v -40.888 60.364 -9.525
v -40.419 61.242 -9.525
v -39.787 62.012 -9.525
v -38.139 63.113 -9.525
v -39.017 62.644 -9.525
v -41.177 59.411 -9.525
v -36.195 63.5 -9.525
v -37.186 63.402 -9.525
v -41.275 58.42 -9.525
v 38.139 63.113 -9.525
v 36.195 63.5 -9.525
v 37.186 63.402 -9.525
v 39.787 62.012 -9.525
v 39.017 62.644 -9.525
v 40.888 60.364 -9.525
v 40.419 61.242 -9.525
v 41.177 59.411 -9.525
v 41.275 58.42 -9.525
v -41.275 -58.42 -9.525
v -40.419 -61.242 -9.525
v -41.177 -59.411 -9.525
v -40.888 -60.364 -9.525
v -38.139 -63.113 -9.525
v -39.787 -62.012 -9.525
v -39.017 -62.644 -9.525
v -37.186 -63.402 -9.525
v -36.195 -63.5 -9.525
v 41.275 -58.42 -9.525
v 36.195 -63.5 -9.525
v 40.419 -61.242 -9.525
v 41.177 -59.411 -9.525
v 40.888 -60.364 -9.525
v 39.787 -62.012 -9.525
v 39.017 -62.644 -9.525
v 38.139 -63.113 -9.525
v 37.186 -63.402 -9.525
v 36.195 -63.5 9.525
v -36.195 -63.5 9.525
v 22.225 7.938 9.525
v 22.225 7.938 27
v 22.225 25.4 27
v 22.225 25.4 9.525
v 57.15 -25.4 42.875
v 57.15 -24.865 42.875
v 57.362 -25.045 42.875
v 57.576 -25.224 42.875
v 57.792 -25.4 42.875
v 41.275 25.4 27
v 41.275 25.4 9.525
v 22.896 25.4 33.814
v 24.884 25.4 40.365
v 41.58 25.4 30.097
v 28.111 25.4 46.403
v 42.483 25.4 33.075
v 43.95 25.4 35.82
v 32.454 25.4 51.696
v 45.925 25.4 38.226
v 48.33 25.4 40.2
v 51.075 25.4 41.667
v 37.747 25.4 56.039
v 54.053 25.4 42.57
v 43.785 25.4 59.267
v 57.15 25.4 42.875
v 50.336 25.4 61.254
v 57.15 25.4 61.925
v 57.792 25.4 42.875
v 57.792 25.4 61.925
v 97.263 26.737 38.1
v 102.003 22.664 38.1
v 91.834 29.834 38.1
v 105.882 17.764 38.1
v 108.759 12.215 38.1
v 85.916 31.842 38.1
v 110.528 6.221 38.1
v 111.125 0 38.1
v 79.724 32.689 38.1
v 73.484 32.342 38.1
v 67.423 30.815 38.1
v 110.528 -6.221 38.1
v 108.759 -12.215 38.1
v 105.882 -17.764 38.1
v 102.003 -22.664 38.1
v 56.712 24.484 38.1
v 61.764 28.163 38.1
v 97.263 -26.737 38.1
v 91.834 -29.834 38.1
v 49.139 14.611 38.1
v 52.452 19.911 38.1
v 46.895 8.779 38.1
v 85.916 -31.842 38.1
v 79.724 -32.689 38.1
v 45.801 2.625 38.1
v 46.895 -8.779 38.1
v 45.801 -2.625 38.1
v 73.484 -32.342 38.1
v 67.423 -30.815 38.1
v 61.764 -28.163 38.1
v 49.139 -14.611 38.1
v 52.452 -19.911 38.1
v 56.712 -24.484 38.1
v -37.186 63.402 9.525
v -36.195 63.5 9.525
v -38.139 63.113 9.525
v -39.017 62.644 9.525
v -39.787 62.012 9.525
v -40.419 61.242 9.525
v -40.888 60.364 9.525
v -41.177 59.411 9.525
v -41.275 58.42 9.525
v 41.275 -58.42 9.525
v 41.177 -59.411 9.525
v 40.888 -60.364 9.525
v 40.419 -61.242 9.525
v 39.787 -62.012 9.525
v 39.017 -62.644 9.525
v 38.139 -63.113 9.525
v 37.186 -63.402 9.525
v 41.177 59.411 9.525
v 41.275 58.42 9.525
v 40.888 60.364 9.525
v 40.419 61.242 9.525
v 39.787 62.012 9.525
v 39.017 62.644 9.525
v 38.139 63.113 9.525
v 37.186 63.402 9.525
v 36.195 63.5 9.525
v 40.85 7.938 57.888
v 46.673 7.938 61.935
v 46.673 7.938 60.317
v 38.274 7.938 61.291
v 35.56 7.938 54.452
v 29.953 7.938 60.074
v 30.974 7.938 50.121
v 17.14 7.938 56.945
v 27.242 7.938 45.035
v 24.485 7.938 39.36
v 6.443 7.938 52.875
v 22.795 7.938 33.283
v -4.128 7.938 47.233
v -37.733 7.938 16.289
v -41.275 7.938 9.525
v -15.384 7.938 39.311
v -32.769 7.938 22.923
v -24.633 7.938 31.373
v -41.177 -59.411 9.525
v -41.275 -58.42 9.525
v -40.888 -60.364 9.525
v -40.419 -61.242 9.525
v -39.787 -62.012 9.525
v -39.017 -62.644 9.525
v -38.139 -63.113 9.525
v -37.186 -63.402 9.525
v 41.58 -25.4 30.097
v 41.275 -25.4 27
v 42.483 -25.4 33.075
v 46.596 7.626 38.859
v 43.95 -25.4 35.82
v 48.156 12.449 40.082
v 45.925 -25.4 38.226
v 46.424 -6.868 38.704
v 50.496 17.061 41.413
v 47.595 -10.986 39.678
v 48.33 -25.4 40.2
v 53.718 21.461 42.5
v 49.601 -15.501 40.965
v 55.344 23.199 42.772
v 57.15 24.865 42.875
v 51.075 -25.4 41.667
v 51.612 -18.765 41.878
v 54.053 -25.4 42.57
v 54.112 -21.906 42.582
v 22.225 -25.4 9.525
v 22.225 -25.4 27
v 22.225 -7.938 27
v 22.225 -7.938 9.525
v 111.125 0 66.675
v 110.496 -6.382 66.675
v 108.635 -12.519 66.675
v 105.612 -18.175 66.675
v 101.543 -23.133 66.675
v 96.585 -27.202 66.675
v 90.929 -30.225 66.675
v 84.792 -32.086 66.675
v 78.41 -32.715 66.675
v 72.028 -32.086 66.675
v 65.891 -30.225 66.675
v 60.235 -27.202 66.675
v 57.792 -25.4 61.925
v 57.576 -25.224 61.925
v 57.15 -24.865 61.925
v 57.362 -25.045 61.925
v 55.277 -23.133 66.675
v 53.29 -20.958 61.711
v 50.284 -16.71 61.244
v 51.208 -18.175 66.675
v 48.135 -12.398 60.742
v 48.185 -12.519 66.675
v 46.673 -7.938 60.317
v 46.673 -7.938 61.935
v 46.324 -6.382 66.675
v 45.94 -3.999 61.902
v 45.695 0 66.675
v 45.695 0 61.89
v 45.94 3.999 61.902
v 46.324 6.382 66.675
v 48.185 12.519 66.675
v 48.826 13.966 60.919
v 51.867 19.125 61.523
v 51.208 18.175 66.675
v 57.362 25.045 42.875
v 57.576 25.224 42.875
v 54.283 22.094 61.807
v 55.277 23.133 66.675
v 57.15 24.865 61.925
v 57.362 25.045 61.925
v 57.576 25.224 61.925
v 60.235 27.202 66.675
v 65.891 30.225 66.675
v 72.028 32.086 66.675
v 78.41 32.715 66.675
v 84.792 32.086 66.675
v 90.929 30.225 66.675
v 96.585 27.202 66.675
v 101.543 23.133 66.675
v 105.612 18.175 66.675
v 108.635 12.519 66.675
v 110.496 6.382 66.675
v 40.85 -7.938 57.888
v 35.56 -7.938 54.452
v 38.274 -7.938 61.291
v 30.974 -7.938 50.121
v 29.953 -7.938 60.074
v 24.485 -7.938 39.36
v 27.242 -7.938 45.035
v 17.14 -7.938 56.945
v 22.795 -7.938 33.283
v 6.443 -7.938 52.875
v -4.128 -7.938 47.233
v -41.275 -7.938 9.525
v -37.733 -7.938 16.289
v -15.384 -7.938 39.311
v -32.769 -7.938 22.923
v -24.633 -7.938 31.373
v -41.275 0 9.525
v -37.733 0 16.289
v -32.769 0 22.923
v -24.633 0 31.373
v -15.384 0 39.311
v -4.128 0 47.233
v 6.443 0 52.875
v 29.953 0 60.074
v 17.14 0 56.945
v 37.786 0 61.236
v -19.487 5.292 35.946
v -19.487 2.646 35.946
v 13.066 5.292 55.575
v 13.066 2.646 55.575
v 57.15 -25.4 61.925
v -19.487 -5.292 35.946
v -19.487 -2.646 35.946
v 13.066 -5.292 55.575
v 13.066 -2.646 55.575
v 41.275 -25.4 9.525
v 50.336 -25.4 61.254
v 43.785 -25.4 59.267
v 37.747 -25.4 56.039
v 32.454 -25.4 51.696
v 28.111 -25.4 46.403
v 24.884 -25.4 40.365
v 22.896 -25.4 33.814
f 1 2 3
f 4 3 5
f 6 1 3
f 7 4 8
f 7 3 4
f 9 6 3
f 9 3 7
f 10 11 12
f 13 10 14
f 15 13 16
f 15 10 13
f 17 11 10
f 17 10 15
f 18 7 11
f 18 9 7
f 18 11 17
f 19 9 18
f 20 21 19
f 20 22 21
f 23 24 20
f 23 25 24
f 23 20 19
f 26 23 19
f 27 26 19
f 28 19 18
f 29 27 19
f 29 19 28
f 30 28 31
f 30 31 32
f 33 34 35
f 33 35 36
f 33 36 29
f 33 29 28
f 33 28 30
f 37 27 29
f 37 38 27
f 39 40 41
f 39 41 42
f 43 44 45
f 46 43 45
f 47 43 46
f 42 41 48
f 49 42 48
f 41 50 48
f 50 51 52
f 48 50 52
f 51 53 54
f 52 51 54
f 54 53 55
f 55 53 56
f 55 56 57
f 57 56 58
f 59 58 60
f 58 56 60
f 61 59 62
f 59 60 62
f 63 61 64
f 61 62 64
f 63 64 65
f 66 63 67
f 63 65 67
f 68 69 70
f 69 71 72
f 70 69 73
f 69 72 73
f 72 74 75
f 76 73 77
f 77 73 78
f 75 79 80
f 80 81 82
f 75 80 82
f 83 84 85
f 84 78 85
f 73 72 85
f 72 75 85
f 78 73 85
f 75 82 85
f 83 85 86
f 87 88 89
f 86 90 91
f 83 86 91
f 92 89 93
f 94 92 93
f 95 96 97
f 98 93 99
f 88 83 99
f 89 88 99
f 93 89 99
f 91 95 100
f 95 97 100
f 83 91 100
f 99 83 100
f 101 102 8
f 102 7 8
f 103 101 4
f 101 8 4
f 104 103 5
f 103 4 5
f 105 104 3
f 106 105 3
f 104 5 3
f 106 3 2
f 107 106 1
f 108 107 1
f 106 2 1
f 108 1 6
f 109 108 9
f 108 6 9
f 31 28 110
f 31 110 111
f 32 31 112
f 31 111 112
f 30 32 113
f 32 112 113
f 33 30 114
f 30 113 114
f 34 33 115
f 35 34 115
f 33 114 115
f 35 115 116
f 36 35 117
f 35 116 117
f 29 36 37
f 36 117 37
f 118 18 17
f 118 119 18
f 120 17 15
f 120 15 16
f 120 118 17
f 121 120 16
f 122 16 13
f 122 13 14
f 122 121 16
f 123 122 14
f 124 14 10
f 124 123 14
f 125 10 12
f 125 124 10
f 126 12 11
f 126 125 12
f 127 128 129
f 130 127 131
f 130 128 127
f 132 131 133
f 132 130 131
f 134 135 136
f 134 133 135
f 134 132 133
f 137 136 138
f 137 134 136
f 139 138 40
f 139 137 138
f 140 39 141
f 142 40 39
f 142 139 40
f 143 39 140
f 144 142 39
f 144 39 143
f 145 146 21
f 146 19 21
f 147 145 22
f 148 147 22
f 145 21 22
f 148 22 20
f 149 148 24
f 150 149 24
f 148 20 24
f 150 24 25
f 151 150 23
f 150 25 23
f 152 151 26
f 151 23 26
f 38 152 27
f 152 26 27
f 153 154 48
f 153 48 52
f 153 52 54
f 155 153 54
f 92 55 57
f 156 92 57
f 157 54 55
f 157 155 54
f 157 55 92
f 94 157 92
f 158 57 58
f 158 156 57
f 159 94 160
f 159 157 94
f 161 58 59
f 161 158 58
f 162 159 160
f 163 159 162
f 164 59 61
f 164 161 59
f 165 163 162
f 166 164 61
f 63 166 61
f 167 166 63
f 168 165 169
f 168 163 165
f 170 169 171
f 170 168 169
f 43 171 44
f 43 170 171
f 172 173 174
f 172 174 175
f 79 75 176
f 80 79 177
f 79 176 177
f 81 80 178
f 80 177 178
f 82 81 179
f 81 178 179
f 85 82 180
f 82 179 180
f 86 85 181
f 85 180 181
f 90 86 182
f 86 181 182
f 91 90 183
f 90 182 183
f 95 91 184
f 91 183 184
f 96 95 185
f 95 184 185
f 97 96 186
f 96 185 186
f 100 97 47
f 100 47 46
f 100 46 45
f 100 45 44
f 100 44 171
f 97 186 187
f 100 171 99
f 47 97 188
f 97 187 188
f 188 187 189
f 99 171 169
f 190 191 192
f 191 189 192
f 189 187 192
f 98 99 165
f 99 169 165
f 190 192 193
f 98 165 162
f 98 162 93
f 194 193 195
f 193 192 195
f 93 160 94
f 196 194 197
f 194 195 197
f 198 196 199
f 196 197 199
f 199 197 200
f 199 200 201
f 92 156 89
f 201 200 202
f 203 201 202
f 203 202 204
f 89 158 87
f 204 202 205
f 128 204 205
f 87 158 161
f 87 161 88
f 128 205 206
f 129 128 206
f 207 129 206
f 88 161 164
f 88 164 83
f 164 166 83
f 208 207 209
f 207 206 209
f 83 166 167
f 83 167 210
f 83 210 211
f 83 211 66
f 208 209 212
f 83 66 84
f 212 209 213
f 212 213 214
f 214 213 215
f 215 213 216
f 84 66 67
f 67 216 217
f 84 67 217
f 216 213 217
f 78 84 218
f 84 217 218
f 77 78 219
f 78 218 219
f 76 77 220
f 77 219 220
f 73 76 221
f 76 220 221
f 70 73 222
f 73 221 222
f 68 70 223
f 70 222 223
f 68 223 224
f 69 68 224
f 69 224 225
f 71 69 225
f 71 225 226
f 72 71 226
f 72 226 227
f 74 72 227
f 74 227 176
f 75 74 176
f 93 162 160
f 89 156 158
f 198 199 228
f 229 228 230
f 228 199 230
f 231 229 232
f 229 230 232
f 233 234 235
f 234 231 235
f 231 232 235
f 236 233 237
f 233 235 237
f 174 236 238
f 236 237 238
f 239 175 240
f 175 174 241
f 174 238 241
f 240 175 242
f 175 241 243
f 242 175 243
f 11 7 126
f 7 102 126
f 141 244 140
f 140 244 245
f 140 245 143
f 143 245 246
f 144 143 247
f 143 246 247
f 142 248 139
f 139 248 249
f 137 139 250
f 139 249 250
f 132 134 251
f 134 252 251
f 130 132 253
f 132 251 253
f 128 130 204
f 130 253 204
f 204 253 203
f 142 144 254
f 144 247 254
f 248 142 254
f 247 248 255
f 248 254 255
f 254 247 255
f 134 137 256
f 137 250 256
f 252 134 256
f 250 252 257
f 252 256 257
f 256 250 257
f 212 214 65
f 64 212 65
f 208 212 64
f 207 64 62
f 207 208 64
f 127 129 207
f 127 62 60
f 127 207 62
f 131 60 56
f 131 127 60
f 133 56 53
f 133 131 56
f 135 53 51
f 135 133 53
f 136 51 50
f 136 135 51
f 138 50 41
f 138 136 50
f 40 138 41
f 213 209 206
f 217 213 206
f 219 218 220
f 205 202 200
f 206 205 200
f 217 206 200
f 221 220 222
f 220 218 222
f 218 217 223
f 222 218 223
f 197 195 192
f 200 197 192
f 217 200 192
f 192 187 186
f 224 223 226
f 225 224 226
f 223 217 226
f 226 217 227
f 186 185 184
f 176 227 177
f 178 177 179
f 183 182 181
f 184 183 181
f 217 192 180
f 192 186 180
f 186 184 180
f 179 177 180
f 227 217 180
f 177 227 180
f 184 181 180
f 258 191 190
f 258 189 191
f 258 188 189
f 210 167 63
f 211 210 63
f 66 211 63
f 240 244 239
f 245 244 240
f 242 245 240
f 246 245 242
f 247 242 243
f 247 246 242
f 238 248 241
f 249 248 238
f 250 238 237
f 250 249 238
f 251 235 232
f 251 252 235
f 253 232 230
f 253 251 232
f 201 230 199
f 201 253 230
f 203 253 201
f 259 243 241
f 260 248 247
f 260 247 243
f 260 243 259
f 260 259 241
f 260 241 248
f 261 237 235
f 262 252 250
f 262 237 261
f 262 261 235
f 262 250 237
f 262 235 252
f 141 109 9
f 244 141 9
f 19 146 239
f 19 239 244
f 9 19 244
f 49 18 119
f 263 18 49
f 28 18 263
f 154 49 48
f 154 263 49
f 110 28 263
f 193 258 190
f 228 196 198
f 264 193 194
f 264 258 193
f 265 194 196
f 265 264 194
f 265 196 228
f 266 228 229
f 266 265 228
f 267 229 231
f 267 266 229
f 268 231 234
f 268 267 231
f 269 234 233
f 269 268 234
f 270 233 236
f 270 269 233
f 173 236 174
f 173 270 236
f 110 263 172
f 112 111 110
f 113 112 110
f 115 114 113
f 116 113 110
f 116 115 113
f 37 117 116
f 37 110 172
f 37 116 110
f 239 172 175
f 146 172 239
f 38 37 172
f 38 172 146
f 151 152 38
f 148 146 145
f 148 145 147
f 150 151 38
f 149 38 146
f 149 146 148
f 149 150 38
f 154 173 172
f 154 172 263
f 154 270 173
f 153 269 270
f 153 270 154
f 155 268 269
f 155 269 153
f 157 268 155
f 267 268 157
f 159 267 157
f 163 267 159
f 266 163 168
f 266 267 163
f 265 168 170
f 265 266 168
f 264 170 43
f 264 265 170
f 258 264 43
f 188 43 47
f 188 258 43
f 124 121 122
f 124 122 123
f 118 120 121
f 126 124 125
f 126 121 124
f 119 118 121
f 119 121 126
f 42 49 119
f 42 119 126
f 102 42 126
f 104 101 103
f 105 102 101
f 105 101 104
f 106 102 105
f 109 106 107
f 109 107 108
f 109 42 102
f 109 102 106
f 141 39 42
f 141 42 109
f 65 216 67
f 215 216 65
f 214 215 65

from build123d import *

# Parameters (mm, degrees)
F1_DEPTH = 63.5
F0_W     = 18.0850151875
F0_H     = 19.05
F2_DEPTH = 25.4
F3_DEPTH = 7.9375
F5_R     = 5.08
F6_R     = 5.08


with BuildPart() as f1:
    # F0 (on Front) → F1 (new body, symmetric)
    with BuildSketch(Plane.XZ):
        Polygon((-41.275, -9.525), (41.275, -9.525), (41.275, 9.525), (22.225, 9.525), (-41.275, 9.525), align=None)
    extrude(amount=F1_DEPTH, both=True)

    # F0 (on Front) → F2 (join, symmetric)
    with BuildSketch(Plane.XZ):
        with BuildLine():
            Line((22.225, 9.525), (41.275, 9.525))
            Line((41.275, 9.525), (41.275, 27.0002))
            ThreePointArc((41.275, 27.0002), (45.9246798487, 38.2255201513), (57.15, 42.8752))
            Line((57.15, 42.8752), (60.325, 42.8752))
            Line((60.325, 42.8752), (60.325, 61.9252))
            Line((60.325, 61.9252), (57.15, 61.9252))
            ThreePointArc((57.15, 61.9252), (32.4542956671, 51.6959043329), (22.225, 27.0002))
            Line((22.225, 27.0002), (22.225, 9.525))
        make_face()
        with Locations((69.3675075937, 52.4002)):
            Rectangle(F0_W, F0_H)
    extrude(amount=F2_DEPTH, both=True)

    # F0 (on Front) → F3 (join, symmetric)
    with BuildSketch(Plane.XZ):
        with BuildLine():
            add(Edge.make_bspline(
                [(-41.275, 9.525), (-37.5866588905, 18.8099618573), (-19.5091748913, 37.7919660038), (11.8441398709, 58.454694521), (42.3775529044, 62.5964135267), (57.15, 61.9252)],
                knots=[0, 0, 0, 0, 0.3130865631, 0.6429480461, 1, 1, 1, 1], degree=3))
            Line((-41.275, 9.525), (22.225, 9.525))
            Line((22.225, 9.525), (22.225, 27.0002))
            ThreePointArc((22.225, 27.0002), (32.4542956671, 51.6959043329), (57.15, 61.9252))
        make_face()
    extrude(amount=F3_DEPTH, both=True)

    # F0 (on Front) → F4 (revolve)
    with BuildSketch(Plane.XZ):
        Polygon((78.4100151875, 66.675), (78.4100151875, 61.9252), (78.4100151875, 42.8752), (78.4100151875, 38.1), (111.125, 38.1), (111.125, 66.675), align=None)
    revolve(axis=Axis((78.4100151875, 0, 52.3875), (0, 0, -1)))

    # F5
    f5_edges = [f1.edges().sort_by_distance(p)[0] for p in [
        (-41.275, -63.5, 0),
        (41.275, -63.5, 0),
    ]]
    fillet(f5_edges, radius=F5_R)

    # F6
    f6_edges = [f1.edges().sort_by_distance(p)[0] for p in [
        (41.275, 63.5, 0),
        (-41.275, 63.5, 0),
    ]]
    fillet(f6_edges, radius=F6_R)


solid = f1.part
